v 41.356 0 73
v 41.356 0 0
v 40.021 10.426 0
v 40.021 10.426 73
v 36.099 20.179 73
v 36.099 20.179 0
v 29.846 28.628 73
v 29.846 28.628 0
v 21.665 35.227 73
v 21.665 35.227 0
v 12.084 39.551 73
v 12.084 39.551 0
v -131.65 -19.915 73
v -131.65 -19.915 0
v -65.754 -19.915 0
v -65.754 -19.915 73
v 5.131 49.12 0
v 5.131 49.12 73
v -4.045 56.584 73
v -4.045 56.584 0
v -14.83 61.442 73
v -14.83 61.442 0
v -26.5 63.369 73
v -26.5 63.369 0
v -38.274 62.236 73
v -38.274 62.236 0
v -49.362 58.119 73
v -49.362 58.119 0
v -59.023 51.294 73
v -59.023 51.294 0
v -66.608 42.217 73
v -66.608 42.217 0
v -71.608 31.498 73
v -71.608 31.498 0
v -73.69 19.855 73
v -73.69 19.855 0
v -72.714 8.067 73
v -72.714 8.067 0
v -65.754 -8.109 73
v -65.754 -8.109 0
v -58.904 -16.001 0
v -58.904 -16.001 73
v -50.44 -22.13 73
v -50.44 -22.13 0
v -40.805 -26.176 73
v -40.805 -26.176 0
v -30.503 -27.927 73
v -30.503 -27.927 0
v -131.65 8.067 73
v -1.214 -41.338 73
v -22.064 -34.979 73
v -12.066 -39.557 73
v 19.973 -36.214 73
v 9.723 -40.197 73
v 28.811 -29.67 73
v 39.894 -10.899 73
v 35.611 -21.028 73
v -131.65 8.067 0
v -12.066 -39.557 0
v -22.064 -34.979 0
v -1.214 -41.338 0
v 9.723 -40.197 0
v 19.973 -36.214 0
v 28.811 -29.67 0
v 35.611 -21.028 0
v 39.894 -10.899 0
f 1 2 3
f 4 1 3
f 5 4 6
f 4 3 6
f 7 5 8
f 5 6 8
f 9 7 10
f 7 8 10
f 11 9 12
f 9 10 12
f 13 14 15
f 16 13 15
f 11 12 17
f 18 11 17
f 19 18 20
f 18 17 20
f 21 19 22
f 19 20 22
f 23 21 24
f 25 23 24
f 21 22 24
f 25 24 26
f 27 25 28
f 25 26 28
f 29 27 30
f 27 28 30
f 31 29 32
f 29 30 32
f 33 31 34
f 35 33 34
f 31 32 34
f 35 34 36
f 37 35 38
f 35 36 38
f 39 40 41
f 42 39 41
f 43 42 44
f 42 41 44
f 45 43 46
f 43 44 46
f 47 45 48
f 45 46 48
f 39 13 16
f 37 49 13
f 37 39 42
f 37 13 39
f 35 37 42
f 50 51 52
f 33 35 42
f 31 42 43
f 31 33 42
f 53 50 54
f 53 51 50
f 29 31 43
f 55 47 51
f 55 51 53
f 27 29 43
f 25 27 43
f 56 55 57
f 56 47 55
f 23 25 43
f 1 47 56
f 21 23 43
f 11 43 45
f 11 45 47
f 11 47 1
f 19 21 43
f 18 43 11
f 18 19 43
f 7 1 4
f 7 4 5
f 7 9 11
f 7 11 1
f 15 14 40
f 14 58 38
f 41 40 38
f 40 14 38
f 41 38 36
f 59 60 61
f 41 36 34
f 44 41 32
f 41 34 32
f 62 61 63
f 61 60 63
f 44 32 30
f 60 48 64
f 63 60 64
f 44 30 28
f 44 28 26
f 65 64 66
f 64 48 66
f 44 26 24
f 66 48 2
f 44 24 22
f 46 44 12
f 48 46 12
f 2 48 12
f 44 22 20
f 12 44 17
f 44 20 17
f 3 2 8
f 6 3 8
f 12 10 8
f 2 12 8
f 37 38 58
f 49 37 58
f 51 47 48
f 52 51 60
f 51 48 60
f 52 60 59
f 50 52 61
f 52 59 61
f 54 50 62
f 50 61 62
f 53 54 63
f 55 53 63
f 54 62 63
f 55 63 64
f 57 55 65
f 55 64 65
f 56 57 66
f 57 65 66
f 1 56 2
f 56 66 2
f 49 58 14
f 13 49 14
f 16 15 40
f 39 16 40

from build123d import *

# Parameters (mm, degrees)
F1_DEPTH = 73


with BuildPart() as f1:
    # F0 (on Top) → F1 (new body)
    with BuildSketch(Plane.XY):
        with BuildLine():
            Line((-72.7140201691, 8.0667017028), (-131.6497474909, 8.0667017028))
            Line((-131.6497474909, 8.0667017028), (-131.6497474909, -19.9154652655))
            Line((-131.6497474909, -19.9154652655), (-65.753698349, -19.9154652655))
            Line((-65.753698349, -19.9154652655), (-65.753698349, -8.1091851911))
            ThreePointArc((-65.753698349, -8.1091851911), (-70.0204713157, -0.3597130192), (-72.7140201691, 8.0667017028))
        make_face()
        with BuildLine():
            ThreePointArc((12.0841842232, 39.5514563587), (-43.95195039, 60.5378347362), (-72.7140201691, 8.0667017028))
            Line((-72.7140201691, 8.0667017028), (-65.753698349, 8.0667017028))
            Line((-65.753698349, 8.0667017028), (-65.753698349, -8.1091851911))
            ThreePointArc((-65.753698349, -8.1091851911), (-50.4399597526, -22.1300637719), (-30.5028123826, -27.9271130837))
            ThreePointArc((-30.5028123826, -27.9271130837), (-34.9735728703, 22.0724808102), (12.0841842232, 39.5514563587))
        make_face()
        with BuildLine():
            Line((-65.753698349, 8.0667017028), (-72.7140201691, 8.0667017028))
            ThreePointArc((-72.7140201691, 8.0667017028), (-70.0204713157, -0.3597130192), (-65.753698349, -8.1091851911))
            Line((-65.753698349, -8.1091851911), (-65.753698349, 8.0667017028))
        make_face()
        with BuildLine():
            ThreePointArc((41.3563200543, 0), (33.2423118838, 24.6027215782), (12.0841842232, 39.5514563587))
            ThreePointArc((12.0841842232, 39.5514563587), (16.234552473, 28.9747517123), (17.6471201799, 17.7010260522))
            ThreePointArc((17.6471201799, 17.7010260522), (3.3833749523, -15.4665148831), (-30.5028123826, -27.9271130837))
            ThreePointArc((-30.5028123826, -27.9271130837), (14.9810069252, -38.5475633464), (41.3563200543, 0))
        make_face()
        with BuildLine():
            ThreePointArc((17.6471201799, 17.7010260522), (16.234552473, 28.9747517123), (12.0841842232, 39.5514563587))
            ThreePointArc((12.0841842232, 39.5514563587), (-34.9735728703, 22.0724808102), (-30.5028123826, -27.9271130837))
            ThreePointArc((-30.5028123826, -27.9271130837), (3.3833749523, -15.4665148831), (17.6471201799, 17.7010260522))
        make_face()
    extrude(amount=F1_DEPTH)


solid = f1.part
